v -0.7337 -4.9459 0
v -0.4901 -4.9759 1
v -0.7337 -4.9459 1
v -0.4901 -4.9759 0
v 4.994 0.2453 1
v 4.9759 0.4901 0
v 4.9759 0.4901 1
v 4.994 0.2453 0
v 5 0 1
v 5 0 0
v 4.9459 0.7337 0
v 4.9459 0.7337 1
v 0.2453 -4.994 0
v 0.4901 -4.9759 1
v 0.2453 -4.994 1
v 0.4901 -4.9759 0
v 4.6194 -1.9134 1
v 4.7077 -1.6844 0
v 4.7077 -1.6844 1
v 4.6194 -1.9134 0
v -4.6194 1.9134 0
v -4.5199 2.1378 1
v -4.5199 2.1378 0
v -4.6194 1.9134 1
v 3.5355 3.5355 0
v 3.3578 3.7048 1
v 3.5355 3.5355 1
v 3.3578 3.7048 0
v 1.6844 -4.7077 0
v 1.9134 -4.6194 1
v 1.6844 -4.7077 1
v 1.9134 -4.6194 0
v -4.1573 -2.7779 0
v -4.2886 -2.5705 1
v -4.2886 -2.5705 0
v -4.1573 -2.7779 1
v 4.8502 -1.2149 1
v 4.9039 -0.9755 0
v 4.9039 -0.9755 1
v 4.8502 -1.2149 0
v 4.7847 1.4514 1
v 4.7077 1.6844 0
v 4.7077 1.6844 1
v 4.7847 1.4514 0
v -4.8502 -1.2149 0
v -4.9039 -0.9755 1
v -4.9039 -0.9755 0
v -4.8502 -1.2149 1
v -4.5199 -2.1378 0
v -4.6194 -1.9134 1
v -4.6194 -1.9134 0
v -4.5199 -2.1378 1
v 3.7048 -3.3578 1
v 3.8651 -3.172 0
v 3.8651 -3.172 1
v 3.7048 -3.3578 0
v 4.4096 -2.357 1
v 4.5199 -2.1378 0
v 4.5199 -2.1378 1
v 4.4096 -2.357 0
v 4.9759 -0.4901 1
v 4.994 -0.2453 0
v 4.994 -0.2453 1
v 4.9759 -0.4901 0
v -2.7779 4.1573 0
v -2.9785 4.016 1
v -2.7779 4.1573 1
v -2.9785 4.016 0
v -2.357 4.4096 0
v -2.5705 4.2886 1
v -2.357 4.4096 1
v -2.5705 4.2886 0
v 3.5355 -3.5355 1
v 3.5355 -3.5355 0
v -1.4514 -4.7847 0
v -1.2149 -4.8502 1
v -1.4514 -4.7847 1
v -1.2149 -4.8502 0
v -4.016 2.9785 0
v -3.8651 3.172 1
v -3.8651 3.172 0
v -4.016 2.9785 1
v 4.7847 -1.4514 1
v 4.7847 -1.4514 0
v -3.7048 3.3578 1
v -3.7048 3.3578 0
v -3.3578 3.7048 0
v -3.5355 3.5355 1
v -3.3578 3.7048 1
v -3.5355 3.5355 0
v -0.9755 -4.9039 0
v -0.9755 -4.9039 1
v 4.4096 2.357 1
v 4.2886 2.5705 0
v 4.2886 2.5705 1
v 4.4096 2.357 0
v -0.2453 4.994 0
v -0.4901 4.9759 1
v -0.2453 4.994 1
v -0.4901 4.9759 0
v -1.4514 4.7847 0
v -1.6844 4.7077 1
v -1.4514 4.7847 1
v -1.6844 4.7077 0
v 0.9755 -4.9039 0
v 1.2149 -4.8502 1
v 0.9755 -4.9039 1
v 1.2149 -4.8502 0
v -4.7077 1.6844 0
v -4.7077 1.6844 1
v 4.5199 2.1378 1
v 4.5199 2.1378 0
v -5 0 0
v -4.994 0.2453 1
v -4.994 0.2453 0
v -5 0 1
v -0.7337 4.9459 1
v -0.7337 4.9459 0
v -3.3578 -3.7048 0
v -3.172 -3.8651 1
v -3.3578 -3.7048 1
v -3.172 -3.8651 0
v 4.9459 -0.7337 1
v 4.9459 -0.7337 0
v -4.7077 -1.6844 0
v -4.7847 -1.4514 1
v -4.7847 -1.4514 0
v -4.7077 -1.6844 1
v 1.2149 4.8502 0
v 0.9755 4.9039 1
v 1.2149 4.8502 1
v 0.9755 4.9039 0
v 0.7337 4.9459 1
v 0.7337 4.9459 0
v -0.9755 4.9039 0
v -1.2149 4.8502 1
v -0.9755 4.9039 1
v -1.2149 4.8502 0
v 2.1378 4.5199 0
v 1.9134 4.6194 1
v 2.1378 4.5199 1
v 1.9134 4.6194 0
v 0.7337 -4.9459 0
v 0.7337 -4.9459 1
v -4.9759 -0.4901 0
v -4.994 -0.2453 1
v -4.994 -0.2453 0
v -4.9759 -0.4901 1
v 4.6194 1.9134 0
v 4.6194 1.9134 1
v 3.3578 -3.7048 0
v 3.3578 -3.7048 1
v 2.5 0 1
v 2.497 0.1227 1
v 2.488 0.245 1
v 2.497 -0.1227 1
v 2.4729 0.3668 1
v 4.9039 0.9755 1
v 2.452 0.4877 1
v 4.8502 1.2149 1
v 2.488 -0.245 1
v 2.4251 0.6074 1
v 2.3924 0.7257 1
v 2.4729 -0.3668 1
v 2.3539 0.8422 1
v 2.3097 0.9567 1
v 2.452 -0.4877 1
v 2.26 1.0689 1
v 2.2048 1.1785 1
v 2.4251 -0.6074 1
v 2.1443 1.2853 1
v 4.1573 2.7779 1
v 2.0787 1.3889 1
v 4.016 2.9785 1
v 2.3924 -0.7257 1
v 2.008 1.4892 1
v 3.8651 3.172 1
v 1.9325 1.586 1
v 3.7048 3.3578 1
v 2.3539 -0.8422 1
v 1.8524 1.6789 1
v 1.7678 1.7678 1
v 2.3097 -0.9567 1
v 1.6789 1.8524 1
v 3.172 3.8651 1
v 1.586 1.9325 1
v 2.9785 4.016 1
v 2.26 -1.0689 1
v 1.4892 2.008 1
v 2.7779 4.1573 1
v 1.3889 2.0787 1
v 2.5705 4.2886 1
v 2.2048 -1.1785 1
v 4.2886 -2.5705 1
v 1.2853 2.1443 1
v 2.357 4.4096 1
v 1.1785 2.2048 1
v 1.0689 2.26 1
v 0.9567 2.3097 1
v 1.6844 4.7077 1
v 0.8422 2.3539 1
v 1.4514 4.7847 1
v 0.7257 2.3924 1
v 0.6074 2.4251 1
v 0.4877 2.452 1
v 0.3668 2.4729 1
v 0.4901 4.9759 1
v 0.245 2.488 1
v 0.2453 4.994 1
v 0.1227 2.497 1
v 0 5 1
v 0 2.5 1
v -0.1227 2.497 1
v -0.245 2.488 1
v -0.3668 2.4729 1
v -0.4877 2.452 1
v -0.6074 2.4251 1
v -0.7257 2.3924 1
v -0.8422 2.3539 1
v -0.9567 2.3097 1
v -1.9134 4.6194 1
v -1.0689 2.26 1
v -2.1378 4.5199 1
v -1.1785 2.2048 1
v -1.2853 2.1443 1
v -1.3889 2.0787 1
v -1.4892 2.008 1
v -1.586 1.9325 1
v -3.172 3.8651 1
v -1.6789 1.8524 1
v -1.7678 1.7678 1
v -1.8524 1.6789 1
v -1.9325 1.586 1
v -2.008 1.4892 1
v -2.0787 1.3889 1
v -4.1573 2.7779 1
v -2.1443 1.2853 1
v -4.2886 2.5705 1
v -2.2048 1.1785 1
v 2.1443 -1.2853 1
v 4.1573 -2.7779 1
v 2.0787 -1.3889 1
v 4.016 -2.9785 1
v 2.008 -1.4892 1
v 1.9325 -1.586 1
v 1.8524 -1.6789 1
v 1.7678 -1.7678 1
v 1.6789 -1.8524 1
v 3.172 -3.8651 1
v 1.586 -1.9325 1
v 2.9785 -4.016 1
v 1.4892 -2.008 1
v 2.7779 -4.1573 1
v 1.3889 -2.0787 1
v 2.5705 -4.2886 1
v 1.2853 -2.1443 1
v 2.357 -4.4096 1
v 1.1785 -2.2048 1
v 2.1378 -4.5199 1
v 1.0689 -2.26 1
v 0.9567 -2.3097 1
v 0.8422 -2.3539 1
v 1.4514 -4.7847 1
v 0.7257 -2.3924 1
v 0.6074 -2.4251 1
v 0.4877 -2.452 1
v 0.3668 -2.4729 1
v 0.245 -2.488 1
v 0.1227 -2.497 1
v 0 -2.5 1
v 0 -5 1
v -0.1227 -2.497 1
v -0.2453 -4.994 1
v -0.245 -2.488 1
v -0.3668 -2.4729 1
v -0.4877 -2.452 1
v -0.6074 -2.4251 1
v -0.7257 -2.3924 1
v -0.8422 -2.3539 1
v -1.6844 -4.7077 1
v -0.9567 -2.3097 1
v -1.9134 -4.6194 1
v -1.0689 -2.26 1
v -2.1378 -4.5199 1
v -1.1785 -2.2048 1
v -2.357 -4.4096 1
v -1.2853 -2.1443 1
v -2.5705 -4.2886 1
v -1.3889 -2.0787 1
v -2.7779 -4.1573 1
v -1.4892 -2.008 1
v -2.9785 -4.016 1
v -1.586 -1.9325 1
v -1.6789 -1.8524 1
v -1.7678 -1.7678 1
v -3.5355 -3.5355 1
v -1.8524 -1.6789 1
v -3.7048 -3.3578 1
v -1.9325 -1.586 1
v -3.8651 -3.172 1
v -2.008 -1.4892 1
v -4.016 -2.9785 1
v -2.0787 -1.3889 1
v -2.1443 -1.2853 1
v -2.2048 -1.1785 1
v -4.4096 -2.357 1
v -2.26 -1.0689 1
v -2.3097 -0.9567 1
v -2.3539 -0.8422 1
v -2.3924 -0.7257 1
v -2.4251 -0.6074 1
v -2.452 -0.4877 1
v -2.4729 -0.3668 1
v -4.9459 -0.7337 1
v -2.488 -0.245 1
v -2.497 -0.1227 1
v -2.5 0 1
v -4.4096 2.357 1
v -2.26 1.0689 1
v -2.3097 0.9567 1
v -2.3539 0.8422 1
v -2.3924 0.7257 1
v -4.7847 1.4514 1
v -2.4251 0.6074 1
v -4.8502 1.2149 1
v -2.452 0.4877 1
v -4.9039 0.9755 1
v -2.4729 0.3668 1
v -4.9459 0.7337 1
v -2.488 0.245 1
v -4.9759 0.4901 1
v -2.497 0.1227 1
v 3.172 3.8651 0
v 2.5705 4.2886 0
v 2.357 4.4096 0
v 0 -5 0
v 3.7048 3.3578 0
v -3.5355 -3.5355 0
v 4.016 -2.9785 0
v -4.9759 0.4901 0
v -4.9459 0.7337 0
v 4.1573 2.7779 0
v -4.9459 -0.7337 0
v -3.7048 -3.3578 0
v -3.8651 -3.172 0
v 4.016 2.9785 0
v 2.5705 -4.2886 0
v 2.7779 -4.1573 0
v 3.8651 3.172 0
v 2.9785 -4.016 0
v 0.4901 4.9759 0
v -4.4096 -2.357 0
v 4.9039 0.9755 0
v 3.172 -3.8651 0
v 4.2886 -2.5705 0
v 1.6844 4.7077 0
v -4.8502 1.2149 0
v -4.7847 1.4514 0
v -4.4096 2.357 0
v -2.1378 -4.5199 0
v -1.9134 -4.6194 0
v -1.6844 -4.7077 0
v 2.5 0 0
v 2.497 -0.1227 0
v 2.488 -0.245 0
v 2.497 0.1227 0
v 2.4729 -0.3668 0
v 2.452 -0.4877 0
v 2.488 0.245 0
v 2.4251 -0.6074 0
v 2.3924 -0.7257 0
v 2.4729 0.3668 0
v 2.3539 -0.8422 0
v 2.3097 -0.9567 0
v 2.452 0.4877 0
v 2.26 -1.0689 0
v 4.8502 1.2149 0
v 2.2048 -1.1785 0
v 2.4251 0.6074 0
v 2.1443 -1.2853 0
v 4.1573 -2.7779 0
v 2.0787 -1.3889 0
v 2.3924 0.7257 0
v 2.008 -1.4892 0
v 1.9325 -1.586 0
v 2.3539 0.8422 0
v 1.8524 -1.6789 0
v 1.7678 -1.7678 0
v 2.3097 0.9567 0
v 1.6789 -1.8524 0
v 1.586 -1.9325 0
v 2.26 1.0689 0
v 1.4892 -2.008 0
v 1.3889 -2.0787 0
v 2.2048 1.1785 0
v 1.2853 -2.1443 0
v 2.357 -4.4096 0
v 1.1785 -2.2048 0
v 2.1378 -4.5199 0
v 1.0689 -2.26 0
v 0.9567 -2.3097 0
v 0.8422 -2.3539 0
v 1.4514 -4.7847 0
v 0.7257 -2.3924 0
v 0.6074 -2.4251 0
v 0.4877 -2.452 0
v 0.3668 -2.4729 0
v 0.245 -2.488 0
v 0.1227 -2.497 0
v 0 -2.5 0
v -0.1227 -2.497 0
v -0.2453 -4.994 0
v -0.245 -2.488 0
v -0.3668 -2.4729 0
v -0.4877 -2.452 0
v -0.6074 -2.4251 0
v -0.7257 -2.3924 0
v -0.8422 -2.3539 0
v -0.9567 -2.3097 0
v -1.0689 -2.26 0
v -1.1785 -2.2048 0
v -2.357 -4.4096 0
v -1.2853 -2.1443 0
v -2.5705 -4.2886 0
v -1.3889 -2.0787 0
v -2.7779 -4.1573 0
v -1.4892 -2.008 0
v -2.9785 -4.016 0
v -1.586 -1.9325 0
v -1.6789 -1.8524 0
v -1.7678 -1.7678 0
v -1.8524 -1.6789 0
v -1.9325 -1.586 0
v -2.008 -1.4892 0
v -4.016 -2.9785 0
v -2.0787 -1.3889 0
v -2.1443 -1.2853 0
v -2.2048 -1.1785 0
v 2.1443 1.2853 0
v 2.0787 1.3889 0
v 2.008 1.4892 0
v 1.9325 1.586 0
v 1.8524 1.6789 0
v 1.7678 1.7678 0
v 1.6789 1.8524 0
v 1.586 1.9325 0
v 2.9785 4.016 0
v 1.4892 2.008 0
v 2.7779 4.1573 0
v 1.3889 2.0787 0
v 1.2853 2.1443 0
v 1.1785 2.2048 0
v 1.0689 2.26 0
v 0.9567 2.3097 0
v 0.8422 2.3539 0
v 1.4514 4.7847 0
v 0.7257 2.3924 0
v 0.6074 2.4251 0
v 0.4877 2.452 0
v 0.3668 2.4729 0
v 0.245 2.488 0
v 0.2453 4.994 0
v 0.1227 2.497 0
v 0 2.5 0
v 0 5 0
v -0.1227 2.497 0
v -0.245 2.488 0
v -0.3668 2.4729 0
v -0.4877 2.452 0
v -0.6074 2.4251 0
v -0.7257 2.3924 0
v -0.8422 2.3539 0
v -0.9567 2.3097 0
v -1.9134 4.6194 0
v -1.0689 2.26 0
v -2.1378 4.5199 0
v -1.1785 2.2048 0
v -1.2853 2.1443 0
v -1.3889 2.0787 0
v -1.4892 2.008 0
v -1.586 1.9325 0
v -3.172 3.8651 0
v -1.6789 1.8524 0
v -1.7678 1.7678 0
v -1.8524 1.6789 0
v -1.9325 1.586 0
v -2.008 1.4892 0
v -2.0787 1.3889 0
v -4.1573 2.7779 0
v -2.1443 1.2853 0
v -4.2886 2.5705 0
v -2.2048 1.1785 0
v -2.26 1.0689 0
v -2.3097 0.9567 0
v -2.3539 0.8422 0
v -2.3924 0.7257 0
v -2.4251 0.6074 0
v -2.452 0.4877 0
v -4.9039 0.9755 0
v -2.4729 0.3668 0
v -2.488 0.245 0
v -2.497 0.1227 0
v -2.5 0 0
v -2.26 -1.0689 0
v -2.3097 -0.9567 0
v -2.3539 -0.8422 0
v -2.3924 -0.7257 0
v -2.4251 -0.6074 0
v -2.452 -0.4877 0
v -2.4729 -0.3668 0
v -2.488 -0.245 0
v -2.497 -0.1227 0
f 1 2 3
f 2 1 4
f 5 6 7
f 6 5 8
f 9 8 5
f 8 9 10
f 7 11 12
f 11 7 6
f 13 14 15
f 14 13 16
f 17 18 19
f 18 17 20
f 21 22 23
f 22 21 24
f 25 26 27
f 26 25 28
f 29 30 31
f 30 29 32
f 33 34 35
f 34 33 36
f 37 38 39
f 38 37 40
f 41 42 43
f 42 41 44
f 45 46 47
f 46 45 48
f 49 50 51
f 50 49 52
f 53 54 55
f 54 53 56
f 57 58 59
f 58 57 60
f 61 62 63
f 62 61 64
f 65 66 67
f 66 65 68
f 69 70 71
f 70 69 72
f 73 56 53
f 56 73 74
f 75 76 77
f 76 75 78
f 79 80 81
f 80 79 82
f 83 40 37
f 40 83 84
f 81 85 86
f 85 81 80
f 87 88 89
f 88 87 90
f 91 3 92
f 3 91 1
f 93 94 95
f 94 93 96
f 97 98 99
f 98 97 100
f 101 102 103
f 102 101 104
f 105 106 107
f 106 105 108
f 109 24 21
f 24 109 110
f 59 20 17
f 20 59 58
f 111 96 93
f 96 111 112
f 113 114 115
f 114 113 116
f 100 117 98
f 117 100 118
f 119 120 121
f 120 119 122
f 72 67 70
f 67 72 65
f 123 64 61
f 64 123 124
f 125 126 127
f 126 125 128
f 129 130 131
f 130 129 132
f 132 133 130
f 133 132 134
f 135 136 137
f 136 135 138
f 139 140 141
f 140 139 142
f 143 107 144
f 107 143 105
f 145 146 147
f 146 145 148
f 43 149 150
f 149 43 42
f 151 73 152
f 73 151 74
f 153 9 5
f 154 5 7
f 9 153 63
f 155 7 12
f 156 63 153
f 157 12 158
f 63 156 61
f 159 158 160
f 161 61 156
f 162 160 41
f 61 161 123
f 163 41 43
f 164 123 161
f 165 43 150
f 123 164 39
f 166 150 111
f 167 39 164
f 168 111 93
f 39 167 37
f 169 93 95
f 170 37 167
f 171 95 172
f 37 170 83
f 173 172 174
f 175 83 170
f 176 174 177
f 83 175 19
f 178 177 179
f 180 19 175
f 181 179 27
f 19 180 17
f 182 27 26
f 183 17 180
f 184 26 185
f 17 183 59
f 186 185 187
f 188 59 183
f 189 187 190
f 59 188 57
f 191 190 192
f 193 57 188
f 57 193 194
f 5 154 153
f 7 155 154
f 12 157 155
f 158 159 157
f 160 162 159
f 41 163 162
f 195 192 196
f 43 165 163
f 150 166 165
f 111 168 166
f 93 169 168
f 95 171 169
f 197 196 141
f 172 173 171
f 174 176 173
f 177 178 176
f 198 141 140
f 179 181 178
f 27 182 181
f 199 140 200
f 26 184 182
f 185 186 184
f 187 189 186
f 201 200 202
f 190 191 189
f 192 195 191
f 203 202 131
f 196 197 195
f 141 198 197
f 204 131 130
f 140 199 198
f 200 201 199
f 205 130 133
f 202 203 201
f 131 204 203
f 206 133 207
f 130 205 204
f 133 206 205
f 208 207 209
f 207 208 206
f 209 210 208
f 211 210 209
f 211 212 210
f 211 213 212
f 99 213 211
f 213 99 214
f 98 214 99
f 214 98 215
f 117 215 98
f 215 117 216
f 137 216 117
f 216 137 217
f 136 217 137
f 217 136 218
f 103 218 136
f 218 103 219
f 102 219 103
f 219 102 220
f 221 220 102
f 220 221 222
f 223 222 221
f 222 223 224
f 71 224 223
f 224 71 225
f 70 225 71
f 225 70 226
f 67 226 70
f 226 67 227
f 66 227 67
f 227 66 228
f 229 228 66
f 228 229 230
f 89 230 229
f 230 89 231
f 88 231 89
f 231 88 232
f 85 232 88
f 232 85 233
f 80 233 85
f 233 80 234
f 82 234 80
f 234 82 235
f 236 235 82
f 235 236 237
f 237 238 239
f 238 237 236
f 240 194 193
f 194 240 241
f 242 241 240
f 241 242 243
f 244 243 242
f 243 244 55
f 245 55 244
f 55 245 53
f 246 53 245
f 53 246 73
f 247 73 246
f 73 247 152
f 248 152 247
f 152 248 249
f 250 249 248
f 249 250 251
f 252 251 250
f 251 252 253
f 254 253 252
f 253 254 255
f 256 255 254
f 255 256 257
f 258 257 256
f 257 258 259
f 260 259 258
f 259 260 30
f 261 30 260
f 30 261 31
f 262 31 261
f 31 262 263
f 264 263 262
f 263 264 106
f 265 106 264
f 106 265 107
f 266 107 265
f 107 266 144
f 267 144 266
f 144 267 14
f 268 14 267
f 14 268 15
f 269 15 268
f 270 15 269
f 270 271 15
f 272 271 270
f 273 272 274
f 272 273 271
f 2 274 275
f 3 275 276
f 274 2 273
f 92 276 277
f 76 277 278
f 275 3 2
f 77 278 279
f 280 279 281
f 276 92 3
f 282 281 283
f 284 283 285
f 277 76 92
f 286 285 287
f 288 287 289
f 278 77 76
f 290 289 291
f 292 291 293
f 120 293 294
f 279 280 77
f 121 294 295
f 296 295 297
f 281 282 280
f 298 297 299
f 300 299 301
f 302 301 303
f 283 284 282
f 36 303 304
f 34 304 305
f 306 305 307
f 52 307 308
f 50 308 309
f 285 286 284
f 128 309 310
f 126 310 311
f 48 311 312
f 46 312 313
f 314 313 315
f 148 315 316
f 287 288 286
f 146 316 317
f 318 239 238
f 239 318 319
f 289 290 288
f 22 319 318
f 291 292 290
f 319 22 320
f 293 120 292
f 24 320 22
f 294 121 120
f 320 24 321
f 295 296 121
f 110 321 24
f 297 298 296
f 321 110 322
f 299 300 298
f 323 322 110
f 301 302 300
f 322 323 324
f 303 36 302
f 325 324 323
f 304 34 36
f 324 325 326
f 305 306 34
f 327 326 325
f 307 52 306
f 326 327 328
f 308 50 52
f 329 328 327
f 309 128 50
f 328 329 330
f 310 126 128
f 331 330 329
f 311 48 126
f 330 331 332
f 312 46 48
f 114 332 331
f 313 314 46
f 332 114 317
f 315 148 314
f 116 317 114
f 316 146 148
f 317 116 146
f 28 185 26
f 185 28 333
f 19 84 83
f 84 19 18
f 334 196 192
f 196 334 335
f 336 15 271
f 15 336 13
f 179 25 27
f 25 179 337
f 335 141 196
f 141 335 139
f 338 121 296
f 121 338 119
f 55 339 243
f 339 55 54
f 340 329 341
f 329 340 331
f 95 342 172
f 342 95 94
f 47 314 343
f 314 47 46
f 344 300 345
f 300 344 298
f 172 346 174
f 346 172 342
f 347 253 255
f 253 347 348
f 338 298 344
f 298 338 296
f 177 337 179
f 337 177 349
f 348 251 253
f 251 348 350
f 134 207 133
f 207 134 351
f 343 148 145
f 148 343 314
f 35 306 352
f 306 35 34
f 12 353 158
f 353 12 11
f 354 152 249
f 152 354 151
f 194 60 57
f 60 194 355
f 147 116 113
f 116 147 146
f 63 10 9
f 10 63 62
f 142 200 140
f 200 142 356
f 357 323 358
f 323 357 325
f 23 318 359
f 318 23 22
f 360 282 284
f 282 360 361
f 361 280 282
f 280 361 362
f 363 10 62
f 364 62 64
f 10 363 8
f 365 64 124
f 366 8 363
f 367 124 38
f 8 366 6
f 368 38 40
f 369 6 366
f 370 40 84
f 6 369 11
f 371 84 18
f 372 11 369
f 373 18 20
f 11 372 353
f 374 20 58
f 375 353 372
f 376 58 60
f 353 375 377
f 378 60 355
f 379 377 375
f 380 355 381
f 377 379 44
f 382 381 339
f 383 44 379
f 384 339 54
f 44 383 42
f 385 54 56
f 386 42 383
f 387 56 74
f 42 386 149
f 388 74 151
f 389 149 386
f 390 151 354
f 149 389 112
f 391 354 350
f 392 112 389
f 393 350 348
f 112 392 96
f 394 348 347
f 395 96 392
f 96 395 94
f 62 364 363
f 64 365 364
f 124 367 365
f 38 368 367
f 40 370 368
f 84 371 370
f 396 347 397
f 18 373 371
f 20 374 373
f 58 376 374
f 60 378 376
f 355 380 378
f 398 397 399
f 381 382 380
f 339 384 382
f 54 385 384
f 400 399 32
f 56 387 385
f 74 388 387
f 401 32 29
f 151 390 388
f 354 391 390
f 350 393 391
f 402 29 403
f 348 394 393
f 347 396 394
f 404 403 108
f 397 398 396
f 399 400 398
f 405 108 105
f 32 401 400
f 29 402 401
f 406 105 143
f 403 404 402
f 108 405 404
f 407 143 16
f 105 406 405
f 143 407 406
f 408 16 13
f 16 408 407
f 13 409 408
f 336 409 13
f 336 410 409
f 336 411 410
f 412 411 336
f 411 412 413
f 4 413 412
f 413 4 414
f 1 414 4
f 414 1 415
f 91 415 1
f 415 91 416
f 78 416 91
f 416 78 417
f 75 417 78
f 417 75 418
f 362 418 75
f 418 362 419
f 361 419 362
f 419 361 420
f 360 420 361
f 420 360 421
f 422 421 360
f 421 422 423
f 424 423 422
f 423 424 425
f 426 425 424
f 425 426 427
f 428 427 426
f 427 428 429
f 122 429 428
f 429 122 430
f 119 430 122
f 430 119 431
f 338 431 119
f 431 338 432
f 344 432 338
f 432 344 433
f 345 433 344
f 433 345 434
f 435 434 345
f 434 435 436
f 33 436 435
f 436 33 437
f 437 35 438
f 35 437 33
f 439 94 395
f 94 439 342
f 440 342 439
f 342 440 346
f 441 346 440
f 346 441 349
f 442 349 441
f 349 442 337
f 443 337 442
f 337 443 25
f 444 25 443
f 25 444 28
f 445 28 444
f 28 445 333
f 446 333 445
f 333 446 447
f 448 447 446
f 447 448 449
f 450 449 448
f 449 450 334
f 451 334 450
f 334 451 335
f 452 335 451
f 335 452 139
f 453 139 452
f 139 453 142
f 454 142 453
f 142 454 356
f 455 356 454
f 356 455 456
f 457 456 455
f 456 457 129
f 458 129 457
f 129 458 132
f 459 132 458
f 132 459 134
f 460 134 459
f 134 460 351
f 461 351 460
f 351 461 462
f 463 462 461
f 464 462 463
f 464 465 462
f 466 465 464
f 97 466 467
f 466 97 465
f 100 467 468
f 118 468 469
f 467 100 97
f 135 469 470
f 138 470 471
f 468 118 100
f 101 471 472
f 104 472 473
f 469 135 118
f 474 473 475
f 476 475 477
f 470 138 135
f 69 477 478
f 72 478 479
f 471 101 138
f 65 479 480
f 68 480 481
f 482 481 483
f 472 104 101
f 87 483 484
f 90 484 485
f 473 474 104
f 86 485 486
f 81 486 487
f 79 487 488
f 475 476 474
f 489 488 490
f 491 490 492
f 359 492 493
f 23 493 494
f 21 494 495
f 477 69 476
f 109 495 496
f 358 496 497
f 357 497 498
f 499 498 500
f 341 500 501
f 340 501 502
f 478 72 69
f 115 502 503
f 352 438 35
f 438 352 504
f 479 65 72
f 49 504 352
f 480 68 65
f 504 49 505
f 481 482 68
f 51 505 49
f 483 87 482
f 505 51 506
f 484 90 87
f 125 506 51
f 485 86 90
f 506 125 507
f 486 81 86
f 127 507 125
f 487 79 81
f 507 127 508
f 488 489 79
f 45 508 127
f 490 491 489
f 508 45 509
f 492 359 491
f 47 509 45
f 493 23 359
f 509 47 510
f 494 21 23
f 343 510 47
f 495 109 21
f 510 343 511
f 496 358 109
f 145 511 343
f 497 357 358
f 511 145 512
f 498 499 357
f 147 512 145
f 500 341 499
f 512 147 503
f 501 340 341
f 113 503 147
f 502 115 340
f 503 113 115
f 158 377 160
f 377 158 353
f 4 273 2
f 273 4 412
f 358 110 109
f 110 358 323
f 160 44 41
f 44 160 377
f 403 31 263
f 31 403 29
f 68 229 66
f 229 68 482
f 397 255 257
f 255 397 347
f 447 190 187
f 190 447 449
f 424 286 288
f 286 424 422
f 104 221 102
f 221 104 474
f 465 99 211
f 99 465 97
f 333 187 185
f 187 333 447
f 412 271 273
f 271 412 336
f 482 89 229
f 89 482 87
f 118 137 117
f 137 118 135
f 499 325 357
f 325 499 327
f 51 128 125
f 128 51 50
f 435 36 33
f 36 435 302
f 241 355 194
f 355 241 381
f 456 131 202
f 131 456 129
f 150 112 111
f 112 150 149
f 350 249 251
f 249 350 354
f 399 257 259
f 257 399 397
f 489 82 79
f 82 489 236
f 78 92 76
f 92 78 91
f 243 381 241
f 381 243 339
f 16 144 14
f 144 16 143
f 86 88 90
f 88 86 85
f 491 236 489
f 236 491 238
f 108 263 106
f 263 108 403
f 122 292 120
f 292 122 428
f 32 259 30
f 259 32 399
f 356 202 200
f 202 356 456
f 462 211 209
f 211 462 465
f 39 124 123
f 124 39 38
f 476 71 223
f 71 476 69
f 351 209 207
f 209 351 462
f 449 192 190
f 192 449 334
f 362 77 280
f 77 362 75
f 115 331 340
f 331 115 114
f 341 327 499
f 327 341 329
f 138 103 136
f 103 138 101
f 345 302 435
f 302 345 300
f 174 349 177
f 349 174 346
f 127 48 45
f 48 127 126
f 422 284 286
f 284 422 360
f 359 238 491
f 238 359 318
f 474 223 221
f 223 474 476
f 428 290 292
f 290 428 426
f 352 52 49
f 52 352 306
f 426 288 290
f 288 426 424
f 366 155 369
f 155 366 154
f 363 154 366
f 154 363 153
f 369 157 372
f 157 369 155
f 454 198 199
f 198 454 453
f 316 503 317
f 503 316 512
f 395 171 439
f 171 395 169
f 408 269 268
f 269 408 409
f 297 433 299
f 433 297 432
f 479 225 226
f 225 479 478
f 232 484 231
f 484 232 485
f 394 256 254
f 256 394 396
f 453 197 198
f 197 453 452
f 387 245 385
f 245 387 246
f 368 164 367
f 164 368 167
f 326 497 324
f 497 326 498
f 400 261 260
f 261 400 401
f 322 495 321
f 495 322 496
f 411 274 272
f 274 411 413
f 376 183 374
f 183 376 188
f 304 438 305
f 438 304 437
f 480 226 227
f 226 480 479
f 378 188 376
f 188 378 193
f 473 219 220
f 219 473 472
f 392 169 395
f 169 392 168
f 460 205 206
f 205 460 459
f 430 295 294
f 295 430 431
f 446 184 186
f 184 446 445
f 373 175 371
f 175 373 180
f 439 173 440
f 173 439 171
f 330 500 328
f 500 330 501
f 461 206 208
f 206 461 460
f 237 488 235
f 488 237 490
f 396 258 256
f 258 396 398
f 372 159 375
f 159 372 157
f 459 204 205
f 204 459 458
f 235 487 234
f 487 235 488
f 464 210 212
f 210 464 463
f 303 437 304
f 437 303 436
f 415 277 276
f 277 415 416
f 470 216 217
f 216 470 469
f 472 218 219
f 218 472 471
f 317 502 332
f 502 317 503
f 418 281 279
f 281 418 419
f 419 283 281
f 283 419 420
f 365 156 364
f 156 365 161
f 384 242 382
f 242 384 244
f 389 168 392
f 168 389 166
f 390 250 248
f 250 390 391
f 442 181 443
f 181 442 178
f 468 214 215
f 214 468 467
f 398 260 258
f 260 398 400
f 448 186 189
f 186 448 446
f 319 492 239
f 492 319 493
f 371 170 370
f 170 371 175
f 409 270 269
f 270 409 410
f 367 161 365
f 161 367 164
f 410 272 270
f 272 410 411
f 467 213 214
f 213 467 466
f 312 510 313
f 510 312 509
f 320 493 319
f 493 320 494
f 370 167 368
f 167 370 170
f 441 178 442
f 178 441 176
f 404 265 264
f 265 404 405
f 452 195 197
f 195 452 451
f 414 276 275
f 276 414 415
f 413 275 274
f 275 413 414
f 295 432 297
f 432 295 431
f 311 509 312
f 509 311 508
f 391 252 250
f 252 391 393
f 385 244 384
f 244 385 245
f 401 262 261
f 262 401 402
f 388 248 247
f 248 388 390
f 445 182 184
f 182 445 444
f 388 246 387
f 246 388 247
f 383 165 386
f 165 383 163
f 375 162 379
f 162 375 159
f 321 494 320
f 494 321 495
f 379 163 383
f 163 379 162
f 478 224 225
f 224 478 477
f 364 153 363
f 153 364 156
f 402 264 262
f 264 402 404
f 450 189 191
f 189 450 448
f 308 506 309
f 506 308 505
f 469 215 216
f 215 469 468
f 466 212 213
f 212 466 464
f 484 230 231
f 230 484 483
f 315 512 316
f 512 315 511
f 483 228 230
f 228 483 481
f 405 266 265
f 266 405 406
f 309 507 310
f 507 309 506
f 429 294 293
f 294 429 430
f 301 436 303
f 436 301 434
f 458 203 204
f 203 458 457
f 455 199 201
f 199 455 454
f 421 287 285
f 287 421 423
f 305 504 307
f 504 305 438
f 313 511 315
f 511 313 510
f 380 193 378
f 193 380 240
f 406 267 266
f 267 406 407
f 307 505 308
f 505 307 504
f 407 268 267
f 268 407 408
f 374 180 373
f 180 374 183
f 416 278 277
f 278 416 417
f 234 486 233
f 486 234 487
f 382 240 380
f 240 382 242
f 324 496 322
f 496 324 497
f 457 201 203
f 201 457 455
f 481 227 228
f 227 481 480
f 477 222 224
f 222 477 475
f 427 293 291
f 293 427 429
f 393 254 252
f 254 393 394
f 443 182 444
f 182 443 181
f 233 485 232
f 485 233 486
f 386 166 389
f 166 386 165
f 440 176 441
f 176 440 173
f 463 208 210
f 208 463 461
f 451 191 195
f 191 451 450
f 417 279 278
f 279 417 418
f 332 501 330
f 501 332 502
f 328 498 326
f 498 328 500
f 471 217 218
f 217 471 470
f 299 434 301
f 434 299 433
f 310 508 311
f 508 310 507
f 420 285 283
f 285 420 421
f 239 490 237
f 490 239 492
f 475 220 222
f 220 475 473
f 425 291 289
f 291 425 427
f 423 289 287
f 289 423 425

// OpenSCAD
$fn = 128;

inner_d = 5.0;
outer_d = 10.0;
thickness = 1.0;

difference() {
  cylinder(d = outer_d, h = thickness);
  cylinder(d = inner_d, h = thickness + 0.2);
}
